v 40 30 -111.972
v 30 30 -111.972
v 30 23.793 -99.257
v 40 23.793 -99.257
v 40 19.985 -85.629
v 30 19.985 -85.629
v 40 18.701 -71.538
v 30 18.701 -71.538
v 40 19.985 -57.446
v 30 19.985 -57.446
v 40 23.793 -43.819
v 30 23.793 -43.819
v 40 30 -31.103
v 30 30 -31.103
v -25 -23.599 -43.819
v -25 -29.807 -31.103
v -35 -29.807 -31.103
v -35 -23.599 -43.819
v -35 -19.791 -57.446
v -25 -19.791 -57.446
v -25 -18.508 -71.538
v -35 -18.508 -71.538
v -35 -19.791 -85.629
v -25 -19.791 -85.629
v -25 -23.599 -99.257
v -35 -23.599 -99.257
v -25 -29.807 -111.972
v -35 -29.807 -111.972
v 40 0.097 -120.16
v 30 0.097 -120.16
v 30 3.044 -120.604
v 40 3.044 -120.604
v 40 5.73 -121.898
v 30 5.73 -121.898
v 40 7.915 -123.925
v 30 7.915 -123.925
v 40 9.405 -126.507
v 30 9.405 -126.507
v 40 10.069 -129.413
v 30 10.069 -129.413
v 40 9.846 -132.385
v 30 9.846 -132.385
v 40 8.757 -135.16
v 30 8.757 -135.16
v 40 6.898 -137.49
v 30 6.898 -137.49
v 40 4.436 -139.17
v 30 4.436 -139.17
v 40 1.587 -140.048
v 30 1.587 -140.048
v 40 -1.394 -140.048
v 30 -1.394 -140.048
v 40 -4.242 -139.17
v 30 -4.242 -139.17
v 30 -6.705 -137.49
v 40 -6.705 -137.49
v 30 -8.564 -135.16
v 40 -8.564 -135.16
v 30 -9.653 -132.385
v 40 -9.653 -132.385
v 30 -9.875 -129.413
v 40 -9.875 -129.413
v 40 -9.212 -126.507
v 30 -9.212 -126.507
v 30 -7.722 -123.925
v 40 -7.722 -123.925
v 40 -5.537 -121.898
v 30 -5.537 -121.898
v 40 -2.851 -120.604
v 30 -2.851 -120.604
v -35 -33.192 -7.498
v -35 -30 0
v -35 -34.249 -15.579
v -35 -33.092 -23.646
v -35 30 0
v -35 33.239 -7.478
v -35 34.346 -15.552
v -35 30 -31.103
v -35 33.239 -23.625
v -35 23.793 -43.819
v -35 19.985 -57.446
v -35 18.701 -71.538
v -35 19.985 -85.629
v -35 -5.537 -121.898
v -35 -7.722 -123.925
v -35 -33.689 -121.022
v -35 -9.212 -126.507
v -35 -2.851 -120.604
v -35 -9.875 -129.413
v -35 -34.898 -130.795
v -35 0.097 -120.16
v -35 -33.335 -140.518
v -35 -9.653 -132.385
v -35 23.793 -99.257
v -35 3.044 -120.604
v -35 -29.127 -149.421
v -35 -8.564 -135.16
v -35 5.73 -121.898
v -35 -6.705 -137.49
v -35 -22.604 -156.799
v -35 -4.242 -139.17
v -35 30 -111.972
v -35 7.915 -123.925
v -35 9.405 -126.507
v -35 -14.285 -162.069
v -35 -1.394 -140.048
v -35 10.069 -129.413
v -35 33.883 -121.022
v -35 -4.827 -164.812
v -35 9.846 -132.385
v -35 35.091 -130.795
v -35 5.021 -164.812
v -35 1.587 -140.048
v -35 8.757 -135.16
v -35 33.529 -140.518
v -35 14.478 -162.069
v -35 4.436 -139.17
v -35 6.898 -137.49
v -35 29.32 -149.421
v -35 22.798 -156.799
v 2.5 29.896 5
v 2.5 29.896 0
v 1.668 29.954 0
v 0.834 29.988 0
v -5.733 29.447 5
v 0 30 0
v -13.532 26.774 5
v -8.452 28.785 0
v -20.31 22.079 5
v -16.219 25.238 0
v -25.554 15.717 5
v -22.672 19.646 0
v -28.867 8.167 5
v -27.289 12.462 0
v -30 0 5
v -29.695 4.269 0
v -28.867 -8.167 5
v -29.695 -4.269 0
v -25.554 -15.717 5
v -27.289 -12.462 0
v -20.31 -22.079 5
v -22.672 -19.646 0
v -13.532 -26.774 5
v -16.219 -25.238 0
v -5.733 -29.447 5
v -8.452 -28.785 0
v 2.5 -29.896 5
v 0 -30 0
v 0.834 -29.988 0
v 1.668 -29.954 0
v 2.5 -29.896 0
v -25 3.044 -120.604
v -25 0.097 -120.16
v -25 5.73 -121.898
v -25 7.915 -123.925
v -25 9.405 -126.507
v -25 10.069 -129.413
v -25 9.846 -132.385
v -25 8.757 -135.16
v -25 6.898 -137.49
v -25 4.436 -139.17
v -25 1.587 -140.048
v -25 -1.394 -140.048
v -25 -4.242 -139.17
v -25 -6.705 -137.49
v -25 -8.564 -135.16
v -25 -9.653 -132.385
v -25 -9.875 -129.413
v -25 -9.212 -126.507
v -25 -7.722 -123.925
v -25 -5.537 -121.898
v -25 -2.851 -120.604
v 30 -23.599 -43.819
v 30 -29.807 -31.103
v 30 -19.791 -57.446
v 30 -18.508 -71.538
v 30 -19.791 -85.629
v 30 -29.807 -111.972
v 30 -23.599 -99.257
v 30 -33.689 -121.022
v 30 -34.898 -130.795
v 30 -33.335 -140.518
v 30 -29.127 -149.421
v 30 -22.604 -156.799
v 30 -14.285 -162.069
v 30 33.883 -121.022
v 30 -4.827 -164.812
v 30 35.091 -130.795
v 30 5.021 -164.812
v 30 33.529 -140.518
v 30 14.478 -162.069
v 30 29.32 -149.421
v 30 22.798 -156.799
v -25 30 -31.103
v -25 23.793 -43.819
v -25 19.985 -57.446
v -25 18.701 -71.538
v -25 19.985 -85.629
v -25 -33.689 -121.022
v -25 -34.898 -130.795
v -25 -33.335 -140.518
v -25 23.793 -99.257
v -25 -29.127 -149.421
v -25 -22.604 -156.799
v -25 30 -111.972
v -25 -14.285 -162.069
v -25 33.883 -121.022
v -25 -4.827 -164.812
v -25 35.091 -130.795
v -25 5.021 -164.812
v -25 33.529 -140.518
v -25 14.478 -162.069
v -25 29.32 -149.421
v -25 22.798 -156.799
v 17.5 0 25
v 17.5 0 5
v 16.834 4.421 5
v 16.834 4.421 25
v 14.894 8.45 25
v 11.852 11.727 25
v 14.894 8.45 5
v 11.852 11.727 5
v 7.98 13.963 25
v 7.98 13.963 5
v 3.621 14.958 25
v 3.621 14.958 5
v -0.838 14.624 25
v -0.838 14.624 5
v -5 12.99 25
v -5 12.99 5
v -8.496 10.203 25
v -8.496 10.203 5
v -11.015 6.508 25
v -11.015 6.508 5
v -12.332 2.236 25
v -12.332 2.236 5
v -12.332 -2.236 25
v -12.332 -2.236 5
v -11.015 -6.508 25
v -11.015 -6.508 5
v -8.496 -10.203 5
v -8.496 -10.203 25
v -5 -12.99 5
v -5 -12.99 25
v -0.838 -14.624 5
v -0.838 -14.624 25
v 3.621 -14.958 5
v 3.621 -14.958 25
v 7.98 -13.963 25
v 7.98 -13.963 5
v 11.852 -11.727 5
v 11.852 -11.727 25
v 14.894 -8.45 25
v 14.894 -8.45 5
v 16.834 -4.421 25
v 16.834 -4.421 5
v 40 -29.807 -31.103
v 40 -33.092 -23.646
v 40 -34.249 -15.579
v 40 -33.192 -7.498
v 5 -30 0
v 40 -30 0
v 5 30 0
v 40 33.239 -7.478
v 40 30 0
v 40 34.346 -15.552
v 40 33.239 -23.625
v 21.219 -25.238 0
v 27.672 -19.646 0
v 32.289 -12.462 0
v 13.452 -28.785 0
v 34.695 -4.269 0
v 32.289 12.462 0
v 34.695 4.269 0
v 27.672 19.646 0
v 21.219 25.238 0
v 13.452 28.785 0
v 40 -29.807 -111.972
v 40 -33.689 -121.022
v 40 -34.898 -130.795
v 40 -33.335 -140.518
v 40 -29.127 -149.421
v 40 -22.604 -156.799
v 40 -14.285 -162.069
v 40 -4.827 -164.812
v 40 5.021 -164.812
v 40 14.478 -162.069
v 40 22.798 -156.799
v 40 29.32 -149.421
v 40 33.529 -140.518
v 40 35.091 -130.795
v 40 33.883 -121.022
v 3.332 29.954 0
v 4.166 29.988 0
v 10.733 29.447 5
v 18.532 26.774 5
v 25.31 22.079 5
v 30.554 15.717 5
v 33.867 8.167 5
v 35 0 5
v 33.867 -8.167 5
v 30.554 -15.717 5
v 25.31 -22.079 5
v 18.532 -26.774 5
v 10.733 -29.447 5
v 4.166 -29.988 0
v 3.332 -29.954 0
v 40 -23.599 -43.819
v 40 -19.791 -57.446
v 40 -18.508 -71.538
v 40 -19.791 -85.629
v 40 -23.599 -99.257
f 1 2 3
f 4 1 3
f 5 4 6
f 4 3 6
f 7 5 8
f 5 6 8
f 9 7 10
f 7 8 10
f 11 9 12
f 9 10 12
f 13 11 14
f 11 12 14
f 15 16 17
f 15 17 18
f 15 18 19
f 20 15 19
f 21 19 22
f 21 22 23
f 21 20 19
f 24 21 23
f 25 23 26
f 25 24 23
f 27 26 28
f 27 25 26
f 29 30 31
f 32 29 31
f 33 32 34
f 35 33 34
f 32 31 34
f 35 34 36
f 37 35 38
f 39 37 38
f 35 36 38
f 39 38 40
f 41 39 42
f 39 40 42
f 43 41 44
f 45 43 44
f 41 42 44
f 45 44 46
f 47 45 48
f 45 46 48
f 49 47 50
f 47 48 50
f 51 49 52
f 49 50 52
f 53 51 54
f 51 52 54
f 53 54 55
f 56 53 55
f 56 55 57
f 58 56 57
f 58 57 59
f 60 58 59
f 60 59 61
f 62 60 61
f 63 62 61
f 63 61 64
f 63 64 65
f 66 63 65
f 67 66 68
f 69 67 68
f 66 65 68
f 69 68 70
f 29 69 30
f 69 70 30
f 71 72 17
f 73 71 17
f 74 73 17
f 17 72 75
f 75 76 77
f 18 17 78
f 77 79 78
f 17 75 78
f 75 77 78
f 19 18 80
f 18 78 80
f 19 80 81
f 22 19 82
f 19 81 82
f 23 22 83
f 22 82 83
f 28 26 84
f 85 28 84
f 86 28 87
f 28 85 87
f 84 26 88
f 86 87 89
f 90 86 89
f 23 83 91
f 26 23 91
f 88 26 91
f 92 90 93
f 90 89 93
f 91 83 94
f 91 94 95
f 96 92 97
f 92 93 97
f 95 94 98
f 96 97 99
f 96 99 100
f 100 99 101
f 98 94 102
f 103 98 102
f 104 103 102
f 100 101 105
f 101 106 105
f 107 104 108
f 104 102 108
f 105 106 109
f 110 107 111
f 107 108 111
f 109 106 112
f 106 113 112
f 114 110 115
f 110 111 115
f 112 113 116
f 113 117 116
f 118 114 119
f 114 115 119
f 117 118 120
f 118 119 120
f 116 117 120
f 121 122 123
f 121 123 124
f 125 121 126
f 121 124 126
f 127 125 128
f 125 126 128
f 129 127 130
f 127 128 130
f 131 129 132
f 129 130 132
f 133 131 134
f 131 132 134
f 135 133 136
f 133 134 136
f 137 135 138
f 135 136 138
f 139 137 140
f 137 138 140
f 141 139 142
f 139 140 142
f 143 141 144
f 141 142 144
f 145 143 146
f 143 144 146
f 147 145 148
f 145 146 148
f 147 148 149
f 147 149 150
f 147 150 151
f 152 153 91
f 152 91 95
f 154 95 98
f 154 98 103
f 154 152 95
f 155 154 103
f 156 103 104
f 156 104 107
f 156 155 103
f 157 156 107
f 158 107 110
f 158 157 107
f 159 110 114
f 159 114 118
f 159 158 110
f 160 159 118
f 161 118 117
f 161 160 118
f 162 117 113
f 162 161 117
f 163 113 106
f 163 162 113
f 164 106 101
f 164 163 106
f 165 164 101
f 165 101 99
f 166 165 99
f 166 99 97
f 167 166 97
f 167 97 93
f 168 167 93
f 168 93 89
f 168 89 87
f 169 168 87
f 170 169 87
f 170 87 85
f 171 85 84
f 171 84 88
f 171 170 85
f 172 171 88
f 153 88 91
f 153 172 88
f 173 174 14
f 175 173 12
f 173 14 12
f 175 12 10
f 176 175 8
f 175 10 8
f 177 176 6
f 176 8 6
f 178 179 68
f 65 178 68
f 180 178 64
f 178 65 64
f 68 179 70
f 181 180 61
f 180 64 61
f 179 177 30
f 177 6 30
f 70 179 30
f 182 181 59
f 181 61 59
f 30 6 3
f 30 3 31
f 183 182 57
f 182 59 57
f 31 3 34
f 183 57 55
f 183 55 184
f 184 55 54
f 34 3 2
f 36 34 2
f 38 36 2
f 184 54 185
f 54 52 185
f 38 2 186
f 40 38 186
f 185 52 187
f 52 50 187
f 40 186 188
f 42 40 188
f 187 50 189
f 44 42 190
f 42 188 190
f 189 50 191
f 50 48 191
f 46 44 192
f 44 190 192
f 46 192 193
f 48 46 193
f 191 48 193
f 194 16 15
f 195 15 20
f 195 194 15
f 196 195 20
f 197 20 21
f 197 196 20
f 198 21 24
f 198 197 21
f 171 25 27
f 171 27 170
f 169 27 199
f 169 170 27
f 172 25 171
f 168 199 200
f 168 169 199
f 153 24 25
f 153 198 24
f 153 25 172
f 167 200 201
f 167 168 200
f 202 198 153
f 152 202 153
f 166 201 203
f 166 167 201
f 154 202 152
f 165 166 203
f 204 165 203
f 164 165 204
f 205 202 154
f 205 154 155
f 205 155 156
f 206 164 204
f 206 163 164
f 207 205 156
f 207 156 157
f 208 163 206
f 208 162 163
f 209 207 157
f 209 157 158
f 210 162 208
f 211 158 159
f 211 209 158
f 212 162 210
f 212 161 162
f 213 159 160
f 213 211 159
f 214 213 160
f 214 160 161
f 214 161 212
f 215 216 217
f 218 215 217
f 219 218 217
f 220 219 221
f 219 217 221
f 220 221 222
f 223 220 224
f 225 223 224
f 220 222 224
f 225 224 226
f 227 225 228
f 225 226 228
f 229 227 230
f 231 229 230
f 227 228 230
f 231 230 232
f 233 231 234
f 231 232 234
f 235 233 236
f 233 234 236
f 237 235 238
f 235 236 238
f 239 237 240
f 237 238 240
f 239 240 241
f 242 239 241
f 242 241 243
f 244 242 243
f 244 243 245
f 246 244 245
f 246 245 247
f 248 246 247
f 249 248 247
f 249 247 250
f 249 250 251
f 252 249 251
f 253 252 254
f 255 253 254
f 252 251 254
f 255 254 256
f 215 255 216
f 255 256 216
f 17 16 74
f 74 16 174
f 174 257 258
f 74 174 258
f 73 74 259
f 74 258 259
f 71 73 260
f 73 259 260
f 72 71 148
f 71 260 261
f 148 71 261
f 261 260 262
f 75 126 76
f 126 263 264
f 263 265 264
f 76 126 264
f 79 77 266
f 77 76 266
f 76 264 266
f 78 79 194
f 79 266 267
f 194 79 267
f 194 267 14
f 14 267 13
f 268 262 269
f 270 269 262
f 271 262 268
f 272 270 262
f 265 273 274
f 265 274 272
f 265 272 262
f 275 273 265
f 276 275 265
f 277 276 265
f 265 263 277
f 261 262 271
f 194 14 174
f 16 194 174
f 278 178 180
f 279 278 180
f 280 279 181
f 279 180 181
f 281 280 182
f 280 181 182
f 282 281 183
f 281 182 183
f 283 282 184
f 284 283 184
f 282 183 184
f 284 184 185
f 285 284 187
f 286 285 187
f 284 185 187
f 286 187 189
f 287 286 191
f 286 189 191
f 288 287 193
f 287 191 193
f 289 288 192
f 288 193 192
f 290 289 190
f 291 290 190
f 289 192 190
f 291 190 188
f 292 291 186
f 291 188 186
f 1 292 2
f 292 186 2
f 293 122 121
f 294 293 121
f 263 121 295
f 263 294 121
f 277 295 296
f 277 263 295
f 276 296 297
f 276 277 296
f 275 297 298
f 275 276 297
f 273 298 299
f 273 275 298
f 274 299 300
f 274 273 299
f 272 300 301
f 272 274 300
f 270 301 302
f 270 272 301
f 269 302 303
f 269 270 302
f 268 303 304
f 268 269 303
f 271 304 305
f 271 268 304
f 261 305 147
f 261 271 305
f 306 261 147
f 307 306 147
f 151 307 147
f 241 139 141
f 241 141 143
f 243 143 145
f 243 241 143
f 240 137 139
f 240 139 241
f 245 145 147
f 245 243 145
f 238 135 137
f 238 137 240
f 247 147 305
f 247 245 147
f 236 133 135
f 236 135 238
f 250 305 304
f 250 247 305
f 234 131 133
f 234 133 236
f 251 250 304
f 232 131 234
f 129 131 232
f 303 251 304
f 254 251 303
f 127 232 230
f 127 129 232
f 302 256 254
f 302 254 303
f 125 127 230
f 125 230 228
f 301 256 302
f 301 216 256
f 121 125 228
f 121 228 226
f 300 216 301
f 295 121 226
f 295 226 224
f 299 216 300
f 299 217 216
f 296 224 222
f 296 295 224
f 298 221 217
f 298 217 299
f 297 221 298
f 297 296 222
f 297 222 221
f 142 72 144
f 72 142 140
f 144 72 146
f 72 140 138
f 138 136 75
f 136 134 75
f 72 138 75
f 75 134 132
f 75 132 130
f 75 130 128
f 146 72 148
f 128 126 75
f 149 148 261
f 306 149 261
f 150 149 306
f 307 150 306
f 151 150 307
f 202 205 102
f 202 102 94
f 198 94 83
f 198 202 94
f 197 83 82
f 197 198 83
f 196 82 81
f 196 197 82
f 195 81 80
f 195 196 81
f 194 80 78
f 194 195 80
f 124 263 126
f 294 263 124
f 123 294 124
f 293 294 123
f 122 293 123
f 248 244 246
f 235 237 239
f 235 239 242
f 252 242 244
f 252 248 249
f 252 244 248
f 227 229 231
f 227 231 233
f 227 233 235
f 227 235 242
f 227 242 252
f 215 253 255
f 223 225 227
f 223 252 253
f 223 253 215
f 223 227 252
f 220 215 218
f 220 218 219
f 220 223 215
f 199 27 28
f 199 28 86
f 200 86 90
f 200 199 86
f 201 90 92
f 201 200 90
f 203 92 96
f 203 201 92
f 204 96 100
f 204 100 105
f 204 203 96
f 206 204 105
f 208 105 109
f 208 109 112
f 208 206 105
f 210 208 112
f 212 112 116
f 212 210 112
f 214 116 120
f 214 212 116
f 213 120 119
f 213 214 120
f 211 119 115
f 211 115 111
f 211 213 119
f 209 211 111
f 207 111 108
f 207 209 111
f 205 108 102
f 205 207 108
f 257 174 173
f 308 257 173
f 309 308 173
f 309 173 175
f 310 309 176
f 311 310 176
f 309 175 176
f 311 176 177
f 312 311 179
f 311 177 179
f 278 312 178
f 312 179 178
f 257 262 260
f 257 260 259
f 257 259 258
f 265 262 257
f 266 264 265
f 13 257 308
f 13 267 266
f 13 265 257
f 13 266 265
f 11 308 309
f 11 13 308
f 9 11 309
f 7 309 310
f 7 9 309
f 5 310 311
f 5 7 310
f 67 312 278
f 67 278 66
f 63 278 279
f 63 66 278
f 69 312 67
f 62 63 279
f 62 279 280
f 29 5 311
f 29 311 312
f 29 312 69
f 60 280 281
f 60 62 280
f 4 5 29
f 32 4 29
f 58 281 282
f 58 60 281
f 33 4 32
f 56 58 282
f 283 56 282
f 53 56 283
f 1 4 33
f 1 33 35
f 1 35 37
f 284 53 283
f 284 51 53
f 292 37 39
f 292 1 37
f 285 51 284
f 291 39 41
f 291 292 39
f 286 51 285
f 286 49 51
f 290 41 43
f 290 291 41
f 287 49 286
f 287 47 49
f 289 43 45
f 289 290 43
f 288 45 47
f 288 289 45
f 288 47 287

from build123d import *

# Parameters (mm, degrees)
SKETCH1_R           = 30
BOSS_EXTRUDE1_DEPTH = 5
BOSS_EXTRUDE2_DEPTH = 10
BOSS_EXTRUDE3_DEPTH = 55
SKETCH4_R           = 15
BOSS_EXTRUDE4_DEPTH = 20
SKETCH5_R           = 10
CUT_EXTRUDE1_DEPTH  = 10


with BuildPart() as part:
    # Sketch1 → Boss-Extrude1 (new body)
    with BuildSketch(Plane.XY):
        Circle(SKETCH1_R)
    extrude(amount=BOSS_EXTRUDE1_DEPTH)



with BuildPart() as body_2:
    # Sketch2 → Boss-Extrude2 (new body)
    with BuildSketch(Plane(origin=(30, 0, 0), x_dir=(0, 0, -1), z_dir=(1, 0, 0))):
        with BuildLine():
            Line((0, 30), (0, -30))
            ThreePointArc((0, -30), (15.578718077, -34.24908425), (31.103401006, -29.80663067))
            ThreePointArc((31.103401006, -29.80663067), (71.537822314, -18.507886831), (111.972243623, -29.80663067))
            ThreePointArc((111.972243623, -29.80663067), (165.159924398, 0.096684665), (111.972243623, 30))
            ThreePointArc((111.972243623, 30), (71.537822314, 18.701256161), (31.103401006, 30))
            ThreePointArc((31.103401006, 30), (15.551700503, 34.345670707), (0, 30))
        make_face()
    extrude(amount=BOSS_EXTRUDE2_DEPTH)


with BuildPart() as part_1:
    add(part.part)

    add(body_2.part)  # Boss-Extrude3 merges body 2
    # Sketch3 → Boss-Extrude3 (add)
    with BuildSketch(Plane.ZY.offset(-30)):
        with BuildLine():
            Line((-31.103401006, 30), (-31.103401006, -29.80663067))
            ThreePointArc((-31.103401006, -29.80663067), (-15.578718077, -34.24908425), (0, -30))
            Line((0, -30), (0, 30))
            ThreePointArc((0, 30), (-15.551700503, 34.345670707), (-31.103401006, 30))
        make_face()
    extrude(amount=BOSS_EXTRUDE3_DEPTH)

    # Mirror1: part across plane


with BuildPart() as part_2:
    add(part_1.part)
    add(part_1.part.mirror(Plane.ZY.offset(-2.5)))

    # Sketch4 → Boss-Extrude4 (add)
    with BuildSketch(Plane.XY.offset(5)):
        with Locations((2.5, 0)):
            Circle(SKETCH4_R)
    extrude(amount=BOSS_EXTRUDE4_DEPTH)

    # Sketch5 → Cut-Extrude1 (cut)
    with BuildSketch(Plane.ZY.offset(-30)):
        with Locations((-130.159924398, 0.096684665)):
            Circle(SKETCH5_R)
    cut_extrude1 = extrude(amount=-CUT_EXTRUDE1_DEPTH, mode=Mode.SUBTRACT)

    # Mirror2: Cut-Extrude1 across plane
    add(cut_extrude1.mirror(Plane.ZY.offset(-2.5)), mode=Mode.SUBTRACT)


solid = part_2.part
